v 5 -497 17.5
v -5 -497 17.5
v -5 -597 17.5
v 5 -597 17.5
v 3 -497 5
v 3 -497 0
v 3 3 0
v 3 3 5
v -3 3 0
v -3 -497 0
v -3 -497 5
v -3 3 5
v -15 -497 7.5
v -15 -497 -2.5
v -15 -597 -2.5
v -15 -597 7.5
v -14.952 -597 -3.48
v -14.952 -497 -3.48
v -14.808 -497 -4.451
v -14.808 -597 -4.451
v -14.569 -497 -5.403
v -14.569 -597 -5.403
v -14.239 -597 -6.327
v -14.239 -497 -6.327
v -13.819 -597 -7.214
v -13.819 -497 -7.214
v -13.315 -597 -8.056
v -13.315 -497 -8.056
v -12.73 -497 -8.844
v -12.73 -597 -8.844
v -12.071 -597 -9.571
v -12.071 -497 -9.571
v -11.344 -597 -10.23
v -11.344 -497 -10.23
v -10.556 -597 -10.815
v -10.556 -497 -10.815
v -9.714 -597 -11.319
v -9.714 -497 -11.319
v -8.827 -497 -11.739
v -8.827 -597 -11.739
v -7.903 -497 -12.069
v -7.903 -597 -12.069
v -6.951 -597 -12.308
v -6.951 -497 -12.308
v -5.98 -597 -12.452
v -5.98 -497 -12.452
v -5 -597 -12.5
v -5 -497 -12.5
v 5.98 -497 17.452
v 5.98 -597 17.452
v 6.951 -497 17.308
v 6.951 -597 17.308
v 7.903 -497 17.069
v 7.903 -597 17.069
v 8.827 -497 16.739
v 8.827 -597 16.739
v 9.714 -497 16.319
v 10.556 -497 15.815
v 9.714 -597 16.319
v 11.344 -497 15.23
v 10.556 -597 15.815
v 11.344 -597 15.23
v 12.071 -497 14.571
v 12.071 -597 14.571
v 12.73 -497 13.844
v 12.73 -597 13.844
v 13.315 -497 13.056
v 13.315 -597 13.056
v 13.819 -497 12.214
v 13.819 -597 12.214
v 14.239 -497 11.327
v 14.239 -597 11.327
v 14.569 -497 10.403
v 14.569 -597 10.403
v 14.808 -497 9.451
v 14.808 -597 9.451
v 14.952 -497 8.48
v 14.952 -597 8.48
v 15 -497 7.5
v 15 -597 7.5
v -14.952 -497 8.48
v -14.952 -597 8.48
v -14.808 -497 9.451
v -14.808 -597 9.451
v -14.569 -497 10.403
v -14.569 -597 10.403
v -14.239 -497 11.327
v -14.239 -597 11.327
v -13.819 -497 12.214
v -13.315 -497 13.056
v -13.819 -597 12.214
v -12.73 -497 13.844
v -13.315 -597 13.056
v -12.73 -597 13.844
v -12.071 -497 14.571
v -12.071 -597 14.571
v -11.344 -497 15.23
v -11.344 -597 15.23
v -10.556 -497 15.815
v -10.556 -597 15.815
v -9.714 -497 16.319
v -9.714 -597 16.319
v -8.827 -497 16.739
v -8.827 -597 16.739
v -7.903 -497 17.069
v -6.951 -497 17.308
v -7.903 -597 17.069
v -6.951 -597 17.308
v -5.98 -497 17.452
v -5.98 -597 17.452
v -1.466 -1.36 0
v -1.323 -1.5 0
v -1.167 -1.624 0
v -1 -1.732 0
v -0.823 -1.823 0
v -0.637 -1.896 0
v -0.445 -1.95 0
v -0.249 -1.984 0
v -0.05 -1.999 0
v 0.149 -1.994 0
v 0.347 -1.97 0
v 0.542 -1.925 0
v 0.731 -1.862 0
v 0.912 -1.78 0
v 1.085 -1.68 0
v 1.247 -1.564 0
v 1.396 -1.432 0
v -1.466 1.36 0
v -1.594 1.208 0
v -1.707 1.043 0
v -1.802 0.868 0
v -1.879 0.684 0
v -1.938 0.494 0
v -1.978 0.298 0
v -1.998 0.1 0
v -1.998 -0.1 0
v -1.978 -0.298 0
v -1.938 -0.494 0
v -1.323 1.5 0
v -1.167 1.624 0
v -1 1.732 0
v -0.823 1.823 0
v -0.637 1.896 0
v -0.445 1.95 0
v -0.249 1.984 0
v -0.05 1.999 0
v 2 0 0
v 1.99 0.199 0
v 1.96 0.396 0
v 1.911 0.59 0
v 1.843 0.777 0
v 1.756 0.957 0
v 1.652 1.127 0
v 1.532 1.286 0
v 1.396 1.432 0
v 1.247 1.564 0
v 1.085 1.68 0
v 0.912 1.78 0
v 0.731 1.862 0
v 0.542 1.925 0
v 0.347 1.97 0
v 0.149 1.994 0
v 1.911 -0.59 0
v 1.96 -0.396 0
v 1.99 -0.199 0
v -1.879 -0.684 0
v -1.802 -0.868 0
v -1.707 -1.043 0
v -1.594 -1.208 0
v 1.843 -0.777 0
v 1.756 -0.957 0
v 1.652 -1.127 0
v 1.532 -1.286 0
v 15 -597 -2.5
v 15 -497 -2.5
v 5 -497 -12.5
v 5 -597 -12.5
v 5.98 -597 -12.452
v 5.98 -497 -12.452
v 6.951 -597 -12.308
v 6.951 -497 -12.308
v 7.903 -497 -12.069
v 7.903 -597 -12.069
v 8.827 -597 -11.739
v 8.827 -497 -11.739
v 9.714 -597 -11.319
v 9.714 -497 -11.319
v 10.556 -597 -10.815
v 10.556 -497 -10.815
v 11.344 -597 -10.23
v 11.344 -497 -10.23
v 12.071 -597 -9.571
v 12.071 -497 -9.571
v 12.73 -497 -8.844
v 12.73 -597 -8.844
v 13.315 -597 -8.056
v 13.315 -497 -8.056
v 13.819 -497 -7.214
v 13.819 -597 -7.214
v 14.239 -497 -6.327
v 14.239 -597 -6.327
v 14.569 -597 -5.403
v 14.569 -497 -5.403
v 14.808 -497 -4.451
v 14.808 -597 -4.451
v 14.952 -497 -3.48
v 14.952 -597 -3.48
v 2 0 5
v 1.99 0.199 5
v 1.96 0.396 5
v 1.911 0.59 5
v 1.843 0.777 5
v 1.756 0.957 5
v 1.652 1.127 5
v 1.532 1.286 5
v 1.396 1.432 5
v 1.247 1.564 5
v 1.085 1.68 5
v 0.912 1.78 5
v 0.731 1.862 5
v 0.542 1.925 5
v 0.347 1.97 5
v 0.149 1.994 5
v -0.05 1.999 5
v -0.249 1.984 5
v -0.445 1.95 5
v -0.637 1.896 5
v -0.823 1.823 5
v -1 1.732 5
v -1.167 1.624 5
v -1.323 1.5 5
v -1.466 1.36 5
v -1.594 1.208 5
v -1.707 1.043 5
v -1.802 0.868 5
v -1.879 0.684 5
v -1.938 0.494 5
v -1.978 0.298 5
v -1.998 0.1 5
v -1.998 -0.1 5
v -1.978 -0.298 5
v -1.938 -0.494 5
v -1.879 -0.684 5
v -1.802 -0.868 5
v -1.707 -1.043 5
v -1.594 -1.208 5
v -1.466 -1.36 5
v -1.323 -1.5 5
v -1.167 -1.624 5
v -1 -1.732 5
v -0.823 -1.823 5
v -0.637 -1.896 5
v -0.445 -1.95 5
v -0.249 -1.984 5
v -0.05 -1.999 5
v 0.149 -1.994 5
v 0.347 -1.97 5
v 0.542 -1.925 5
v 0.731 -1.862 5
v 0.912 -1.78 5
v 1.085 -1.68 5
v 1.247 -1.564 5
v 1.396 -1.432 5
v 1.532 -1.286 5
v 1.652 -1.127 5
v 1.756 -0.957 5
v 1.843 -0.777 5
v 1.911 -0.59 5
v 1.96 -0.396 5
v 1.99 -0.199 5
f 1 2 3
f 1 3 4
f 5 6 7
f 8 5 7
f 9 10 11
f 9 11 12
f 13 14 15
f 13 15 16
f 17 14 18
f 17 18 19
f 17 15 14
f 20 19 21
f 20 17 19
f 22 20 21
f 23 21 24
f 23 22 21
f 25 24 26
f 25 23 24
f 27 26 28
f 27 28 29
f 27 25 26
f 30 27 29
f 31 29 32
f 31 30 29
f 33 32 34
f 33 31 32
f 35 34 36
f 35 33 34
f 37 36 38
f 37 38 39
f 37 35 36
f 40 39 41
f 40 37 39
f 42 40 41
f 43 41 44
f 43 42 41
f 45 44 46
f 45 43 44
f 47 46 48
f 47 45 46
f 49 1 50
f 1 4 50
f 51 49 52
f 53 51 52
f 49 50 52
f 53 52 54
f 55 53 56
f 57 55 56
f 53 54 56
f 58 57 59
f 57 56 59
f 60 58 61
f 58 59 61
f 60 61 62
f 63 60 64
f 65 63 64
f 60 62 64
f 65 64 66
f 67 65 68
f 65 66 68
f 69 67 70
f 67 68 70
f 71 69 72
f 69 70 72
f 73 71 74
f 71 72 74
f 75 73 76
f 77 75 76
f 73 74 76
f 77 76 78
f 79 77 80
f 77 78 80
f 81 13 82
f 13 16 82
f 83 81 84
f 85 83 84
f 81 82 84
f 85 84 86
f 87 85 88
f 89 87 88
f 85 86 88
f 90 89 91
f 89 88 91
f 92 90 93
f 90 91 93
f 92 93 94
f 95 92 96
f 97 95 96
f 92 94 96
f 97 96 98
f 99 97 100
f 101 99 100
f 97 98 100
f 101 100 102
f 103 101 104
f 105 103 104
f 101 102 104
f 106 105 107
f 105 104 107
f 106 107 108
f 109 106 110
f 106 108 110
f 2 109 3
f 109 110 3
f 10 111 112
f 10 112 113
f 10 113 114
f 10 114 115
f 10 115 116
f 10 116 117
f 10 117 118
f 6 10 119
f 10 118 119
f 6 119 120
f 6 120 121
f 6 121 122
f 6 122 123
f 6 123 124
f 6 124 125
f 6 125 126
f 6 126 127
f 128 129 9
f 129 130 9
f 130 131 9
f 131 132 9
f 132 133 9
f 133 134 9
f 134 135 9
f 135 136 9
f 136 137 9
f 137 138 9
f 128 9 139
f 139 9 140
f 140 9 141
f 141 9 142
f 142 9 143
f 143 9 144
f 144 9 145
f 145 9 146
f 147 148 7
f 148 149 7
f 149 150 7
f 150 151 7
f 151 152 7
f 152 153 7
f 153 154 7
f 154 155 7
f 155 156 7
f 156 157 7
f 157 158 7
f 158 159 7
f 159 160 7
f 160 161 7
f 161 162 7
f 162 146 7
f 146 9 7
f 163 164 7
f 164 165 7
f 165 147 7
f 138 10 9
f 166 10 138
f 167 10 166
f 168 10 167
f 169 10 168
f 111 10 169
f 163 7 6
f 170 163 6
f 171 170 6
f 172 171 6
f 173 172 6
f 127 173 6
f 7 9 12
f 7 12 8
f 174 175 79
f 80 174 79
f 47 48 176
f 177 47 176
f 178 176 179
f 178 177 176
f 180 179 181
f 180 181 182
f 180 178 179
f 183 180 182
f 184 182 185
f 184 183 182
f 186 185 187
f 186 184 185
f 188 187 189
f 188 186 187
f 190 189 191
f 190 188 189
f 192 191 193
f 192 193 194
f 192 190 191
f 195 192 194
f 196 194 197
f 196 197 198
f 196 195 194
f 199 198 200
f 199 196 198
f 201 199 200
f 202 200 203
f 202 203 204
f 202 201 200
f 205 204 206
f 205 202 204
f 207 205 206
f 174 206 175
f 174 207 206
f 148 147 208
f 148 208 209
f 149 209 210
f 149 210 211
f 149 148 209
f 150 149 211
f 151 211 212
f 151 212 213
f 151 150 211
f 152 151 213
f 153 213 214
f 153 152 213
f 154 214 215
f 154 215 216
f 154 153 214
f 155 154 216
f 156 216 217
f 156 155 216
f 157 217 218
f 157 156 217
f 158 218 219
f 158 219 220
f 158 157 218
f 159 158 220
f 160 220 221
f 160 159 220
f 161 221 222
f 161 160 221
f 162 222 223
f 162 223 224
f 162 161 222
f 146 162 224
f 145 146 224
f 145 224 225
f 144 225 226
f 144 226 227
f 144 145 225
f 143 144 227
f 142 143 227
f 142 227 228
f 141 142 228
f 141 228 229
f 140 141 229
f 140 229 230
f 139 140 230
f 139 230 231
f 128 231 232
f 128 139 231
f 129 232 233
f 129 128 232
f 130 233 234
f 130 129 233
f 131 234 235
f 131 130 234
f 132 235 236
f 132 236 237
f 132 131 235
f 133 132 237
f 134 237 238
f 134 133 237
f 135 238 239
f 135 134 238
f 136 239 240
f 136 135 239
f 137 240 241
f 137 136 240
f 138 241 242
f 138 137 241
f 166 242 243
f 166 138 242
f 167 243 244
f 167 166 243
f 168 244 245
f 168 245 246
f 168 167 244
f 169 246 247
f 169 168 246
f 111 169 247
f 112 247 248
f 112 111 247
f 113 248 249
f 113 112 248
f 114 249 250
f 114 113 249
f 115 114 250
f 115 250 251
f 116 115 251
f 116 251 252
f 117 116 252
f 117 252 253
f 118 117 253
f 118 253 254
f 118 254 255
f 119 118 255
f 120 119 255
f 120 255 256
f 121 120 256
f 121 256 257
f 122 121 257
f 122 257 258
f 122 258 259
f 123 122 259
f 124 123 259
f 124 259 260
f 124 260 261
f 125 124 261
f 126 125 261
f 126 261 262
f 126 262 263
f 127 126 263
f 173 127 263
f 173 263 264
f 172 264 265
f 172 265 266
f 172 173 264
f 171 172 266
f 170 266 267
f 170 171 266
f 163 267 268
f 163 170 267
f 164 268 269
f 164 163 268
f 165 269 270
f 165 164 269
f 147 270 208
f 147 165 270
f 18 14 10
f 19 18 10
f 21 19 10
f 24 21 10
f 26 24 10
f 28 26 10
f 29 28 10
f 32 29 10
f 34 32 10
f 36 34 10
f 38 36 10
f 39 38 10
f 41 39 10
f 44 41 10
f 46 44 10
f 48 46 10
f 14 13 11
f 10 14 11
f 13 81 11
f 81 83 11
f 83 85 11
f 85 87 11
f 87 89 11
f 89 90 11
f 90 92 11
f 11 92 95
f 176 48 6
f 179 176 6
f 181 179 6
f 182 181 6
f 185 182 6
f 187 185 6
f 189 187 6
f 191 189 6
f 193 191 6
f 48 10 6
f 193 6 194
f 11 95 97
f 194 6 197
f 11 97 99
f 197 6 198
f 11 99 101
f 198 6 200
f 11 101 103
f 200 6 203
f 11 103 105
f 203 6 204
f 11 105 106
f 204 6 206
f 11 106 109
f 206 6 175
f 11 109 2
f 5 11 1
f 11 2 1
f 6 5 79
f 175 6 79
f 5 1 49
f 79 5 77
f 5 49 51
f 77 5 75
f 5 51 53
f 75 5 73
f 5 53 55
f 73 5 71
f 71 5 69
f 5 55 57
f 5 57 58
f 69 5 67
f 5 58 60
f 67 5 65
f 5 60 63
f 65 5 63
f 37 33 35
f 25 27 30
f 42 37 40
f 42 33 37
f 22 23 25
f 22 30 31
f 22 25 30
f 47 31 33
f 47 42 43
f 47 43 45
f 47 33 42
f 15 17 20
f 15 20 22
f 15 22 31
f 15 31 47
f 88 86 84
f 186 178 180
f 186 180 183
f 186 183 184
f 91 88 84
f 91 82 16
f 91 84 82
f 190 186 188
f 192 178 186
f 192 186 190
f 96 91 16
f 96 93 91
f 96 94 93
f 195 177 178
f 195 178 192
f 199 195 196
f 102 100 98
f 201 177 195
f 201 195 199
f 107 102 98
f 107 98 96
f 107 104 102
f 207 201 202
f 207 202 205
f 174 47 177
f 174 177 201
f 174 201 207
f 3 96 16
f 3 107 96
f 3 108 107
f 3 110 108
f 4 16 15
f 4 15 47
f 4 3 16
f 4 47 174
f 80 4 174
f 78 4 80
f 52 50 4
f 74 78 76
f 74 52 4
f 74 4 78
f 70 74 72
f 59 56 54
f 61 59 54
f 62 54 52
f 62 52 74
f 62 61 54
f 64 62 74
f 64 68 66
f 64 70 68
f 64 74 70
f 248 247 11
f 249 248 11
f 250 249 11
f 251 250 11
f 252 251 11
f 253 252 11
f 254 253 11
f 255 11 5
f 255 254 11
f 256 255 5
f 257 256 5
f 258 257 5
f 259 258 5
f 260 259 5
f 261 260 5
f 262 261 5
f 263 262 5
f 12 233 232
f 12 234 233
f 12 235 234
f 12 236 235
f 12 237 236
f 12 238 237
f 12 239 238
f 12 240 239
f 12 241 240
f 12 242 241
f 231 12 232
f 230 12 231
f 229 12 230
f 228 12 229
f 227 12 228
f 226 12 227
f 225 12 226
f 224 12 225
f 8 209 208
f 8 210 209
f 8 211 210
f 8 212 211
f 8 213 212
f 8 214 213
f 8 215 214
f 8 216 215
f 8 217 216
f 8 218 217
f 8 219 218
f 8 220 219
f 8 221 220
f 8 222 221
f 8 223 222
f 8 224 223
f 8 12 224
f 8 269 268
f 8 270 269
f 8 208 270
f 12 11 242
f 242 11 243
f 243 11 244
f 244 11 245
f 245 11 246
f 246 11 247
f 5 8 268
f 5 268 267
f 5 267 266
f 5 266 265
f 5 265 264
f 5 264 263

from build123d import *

# Parameters (mm, degrees)
SKETCH1_W           = 6
SKETCH1_H           = 500
SKETCH1_R           = 2
BOSS_EXTRUDE1_DEPTH = 5
SKETCH2_W           = 30
SKETCH2_H           = 30
BOSS_EXTRUDE2_DEPTH = 100
FILLET1_R           = 10


with BuildPart() as part:
    # Sketch1 → Boss-Extrude1 (new body)
    with BuildSketch(Plane.XY):
        with Locations((0, -247)):
            Rectangle(SKETCH1_W, SKETCH1_H)
        Circle(SKETCH1_R, mode=Mode.SUBTRACT)
    extrude(amount=BOSS_EXTRUDE1_DEPTH)

    # Sketch2 → Boss-Extrude2 (add)
    with BuildSketch(Plane.XZ.offset(497)):
        with Locations((0, 2.5)):
            Rectangle(SKETCH2_W, SKETCH2_H)
    extrude(amount=BOSS_EXTRUDE2_DEPTH)

    # Fillet1
    fillet1_edges = [part.edges().sort_by_distance(p)[0] for p in [
        (15, -547, -12.5),
        (15, -547, 17.5),
        (-15, -547, 17.5),
        (-15, -547, -12.5),
    ]]
    fillet(fillet1_edges, radius=FILLET1_R)


solid = part.part
